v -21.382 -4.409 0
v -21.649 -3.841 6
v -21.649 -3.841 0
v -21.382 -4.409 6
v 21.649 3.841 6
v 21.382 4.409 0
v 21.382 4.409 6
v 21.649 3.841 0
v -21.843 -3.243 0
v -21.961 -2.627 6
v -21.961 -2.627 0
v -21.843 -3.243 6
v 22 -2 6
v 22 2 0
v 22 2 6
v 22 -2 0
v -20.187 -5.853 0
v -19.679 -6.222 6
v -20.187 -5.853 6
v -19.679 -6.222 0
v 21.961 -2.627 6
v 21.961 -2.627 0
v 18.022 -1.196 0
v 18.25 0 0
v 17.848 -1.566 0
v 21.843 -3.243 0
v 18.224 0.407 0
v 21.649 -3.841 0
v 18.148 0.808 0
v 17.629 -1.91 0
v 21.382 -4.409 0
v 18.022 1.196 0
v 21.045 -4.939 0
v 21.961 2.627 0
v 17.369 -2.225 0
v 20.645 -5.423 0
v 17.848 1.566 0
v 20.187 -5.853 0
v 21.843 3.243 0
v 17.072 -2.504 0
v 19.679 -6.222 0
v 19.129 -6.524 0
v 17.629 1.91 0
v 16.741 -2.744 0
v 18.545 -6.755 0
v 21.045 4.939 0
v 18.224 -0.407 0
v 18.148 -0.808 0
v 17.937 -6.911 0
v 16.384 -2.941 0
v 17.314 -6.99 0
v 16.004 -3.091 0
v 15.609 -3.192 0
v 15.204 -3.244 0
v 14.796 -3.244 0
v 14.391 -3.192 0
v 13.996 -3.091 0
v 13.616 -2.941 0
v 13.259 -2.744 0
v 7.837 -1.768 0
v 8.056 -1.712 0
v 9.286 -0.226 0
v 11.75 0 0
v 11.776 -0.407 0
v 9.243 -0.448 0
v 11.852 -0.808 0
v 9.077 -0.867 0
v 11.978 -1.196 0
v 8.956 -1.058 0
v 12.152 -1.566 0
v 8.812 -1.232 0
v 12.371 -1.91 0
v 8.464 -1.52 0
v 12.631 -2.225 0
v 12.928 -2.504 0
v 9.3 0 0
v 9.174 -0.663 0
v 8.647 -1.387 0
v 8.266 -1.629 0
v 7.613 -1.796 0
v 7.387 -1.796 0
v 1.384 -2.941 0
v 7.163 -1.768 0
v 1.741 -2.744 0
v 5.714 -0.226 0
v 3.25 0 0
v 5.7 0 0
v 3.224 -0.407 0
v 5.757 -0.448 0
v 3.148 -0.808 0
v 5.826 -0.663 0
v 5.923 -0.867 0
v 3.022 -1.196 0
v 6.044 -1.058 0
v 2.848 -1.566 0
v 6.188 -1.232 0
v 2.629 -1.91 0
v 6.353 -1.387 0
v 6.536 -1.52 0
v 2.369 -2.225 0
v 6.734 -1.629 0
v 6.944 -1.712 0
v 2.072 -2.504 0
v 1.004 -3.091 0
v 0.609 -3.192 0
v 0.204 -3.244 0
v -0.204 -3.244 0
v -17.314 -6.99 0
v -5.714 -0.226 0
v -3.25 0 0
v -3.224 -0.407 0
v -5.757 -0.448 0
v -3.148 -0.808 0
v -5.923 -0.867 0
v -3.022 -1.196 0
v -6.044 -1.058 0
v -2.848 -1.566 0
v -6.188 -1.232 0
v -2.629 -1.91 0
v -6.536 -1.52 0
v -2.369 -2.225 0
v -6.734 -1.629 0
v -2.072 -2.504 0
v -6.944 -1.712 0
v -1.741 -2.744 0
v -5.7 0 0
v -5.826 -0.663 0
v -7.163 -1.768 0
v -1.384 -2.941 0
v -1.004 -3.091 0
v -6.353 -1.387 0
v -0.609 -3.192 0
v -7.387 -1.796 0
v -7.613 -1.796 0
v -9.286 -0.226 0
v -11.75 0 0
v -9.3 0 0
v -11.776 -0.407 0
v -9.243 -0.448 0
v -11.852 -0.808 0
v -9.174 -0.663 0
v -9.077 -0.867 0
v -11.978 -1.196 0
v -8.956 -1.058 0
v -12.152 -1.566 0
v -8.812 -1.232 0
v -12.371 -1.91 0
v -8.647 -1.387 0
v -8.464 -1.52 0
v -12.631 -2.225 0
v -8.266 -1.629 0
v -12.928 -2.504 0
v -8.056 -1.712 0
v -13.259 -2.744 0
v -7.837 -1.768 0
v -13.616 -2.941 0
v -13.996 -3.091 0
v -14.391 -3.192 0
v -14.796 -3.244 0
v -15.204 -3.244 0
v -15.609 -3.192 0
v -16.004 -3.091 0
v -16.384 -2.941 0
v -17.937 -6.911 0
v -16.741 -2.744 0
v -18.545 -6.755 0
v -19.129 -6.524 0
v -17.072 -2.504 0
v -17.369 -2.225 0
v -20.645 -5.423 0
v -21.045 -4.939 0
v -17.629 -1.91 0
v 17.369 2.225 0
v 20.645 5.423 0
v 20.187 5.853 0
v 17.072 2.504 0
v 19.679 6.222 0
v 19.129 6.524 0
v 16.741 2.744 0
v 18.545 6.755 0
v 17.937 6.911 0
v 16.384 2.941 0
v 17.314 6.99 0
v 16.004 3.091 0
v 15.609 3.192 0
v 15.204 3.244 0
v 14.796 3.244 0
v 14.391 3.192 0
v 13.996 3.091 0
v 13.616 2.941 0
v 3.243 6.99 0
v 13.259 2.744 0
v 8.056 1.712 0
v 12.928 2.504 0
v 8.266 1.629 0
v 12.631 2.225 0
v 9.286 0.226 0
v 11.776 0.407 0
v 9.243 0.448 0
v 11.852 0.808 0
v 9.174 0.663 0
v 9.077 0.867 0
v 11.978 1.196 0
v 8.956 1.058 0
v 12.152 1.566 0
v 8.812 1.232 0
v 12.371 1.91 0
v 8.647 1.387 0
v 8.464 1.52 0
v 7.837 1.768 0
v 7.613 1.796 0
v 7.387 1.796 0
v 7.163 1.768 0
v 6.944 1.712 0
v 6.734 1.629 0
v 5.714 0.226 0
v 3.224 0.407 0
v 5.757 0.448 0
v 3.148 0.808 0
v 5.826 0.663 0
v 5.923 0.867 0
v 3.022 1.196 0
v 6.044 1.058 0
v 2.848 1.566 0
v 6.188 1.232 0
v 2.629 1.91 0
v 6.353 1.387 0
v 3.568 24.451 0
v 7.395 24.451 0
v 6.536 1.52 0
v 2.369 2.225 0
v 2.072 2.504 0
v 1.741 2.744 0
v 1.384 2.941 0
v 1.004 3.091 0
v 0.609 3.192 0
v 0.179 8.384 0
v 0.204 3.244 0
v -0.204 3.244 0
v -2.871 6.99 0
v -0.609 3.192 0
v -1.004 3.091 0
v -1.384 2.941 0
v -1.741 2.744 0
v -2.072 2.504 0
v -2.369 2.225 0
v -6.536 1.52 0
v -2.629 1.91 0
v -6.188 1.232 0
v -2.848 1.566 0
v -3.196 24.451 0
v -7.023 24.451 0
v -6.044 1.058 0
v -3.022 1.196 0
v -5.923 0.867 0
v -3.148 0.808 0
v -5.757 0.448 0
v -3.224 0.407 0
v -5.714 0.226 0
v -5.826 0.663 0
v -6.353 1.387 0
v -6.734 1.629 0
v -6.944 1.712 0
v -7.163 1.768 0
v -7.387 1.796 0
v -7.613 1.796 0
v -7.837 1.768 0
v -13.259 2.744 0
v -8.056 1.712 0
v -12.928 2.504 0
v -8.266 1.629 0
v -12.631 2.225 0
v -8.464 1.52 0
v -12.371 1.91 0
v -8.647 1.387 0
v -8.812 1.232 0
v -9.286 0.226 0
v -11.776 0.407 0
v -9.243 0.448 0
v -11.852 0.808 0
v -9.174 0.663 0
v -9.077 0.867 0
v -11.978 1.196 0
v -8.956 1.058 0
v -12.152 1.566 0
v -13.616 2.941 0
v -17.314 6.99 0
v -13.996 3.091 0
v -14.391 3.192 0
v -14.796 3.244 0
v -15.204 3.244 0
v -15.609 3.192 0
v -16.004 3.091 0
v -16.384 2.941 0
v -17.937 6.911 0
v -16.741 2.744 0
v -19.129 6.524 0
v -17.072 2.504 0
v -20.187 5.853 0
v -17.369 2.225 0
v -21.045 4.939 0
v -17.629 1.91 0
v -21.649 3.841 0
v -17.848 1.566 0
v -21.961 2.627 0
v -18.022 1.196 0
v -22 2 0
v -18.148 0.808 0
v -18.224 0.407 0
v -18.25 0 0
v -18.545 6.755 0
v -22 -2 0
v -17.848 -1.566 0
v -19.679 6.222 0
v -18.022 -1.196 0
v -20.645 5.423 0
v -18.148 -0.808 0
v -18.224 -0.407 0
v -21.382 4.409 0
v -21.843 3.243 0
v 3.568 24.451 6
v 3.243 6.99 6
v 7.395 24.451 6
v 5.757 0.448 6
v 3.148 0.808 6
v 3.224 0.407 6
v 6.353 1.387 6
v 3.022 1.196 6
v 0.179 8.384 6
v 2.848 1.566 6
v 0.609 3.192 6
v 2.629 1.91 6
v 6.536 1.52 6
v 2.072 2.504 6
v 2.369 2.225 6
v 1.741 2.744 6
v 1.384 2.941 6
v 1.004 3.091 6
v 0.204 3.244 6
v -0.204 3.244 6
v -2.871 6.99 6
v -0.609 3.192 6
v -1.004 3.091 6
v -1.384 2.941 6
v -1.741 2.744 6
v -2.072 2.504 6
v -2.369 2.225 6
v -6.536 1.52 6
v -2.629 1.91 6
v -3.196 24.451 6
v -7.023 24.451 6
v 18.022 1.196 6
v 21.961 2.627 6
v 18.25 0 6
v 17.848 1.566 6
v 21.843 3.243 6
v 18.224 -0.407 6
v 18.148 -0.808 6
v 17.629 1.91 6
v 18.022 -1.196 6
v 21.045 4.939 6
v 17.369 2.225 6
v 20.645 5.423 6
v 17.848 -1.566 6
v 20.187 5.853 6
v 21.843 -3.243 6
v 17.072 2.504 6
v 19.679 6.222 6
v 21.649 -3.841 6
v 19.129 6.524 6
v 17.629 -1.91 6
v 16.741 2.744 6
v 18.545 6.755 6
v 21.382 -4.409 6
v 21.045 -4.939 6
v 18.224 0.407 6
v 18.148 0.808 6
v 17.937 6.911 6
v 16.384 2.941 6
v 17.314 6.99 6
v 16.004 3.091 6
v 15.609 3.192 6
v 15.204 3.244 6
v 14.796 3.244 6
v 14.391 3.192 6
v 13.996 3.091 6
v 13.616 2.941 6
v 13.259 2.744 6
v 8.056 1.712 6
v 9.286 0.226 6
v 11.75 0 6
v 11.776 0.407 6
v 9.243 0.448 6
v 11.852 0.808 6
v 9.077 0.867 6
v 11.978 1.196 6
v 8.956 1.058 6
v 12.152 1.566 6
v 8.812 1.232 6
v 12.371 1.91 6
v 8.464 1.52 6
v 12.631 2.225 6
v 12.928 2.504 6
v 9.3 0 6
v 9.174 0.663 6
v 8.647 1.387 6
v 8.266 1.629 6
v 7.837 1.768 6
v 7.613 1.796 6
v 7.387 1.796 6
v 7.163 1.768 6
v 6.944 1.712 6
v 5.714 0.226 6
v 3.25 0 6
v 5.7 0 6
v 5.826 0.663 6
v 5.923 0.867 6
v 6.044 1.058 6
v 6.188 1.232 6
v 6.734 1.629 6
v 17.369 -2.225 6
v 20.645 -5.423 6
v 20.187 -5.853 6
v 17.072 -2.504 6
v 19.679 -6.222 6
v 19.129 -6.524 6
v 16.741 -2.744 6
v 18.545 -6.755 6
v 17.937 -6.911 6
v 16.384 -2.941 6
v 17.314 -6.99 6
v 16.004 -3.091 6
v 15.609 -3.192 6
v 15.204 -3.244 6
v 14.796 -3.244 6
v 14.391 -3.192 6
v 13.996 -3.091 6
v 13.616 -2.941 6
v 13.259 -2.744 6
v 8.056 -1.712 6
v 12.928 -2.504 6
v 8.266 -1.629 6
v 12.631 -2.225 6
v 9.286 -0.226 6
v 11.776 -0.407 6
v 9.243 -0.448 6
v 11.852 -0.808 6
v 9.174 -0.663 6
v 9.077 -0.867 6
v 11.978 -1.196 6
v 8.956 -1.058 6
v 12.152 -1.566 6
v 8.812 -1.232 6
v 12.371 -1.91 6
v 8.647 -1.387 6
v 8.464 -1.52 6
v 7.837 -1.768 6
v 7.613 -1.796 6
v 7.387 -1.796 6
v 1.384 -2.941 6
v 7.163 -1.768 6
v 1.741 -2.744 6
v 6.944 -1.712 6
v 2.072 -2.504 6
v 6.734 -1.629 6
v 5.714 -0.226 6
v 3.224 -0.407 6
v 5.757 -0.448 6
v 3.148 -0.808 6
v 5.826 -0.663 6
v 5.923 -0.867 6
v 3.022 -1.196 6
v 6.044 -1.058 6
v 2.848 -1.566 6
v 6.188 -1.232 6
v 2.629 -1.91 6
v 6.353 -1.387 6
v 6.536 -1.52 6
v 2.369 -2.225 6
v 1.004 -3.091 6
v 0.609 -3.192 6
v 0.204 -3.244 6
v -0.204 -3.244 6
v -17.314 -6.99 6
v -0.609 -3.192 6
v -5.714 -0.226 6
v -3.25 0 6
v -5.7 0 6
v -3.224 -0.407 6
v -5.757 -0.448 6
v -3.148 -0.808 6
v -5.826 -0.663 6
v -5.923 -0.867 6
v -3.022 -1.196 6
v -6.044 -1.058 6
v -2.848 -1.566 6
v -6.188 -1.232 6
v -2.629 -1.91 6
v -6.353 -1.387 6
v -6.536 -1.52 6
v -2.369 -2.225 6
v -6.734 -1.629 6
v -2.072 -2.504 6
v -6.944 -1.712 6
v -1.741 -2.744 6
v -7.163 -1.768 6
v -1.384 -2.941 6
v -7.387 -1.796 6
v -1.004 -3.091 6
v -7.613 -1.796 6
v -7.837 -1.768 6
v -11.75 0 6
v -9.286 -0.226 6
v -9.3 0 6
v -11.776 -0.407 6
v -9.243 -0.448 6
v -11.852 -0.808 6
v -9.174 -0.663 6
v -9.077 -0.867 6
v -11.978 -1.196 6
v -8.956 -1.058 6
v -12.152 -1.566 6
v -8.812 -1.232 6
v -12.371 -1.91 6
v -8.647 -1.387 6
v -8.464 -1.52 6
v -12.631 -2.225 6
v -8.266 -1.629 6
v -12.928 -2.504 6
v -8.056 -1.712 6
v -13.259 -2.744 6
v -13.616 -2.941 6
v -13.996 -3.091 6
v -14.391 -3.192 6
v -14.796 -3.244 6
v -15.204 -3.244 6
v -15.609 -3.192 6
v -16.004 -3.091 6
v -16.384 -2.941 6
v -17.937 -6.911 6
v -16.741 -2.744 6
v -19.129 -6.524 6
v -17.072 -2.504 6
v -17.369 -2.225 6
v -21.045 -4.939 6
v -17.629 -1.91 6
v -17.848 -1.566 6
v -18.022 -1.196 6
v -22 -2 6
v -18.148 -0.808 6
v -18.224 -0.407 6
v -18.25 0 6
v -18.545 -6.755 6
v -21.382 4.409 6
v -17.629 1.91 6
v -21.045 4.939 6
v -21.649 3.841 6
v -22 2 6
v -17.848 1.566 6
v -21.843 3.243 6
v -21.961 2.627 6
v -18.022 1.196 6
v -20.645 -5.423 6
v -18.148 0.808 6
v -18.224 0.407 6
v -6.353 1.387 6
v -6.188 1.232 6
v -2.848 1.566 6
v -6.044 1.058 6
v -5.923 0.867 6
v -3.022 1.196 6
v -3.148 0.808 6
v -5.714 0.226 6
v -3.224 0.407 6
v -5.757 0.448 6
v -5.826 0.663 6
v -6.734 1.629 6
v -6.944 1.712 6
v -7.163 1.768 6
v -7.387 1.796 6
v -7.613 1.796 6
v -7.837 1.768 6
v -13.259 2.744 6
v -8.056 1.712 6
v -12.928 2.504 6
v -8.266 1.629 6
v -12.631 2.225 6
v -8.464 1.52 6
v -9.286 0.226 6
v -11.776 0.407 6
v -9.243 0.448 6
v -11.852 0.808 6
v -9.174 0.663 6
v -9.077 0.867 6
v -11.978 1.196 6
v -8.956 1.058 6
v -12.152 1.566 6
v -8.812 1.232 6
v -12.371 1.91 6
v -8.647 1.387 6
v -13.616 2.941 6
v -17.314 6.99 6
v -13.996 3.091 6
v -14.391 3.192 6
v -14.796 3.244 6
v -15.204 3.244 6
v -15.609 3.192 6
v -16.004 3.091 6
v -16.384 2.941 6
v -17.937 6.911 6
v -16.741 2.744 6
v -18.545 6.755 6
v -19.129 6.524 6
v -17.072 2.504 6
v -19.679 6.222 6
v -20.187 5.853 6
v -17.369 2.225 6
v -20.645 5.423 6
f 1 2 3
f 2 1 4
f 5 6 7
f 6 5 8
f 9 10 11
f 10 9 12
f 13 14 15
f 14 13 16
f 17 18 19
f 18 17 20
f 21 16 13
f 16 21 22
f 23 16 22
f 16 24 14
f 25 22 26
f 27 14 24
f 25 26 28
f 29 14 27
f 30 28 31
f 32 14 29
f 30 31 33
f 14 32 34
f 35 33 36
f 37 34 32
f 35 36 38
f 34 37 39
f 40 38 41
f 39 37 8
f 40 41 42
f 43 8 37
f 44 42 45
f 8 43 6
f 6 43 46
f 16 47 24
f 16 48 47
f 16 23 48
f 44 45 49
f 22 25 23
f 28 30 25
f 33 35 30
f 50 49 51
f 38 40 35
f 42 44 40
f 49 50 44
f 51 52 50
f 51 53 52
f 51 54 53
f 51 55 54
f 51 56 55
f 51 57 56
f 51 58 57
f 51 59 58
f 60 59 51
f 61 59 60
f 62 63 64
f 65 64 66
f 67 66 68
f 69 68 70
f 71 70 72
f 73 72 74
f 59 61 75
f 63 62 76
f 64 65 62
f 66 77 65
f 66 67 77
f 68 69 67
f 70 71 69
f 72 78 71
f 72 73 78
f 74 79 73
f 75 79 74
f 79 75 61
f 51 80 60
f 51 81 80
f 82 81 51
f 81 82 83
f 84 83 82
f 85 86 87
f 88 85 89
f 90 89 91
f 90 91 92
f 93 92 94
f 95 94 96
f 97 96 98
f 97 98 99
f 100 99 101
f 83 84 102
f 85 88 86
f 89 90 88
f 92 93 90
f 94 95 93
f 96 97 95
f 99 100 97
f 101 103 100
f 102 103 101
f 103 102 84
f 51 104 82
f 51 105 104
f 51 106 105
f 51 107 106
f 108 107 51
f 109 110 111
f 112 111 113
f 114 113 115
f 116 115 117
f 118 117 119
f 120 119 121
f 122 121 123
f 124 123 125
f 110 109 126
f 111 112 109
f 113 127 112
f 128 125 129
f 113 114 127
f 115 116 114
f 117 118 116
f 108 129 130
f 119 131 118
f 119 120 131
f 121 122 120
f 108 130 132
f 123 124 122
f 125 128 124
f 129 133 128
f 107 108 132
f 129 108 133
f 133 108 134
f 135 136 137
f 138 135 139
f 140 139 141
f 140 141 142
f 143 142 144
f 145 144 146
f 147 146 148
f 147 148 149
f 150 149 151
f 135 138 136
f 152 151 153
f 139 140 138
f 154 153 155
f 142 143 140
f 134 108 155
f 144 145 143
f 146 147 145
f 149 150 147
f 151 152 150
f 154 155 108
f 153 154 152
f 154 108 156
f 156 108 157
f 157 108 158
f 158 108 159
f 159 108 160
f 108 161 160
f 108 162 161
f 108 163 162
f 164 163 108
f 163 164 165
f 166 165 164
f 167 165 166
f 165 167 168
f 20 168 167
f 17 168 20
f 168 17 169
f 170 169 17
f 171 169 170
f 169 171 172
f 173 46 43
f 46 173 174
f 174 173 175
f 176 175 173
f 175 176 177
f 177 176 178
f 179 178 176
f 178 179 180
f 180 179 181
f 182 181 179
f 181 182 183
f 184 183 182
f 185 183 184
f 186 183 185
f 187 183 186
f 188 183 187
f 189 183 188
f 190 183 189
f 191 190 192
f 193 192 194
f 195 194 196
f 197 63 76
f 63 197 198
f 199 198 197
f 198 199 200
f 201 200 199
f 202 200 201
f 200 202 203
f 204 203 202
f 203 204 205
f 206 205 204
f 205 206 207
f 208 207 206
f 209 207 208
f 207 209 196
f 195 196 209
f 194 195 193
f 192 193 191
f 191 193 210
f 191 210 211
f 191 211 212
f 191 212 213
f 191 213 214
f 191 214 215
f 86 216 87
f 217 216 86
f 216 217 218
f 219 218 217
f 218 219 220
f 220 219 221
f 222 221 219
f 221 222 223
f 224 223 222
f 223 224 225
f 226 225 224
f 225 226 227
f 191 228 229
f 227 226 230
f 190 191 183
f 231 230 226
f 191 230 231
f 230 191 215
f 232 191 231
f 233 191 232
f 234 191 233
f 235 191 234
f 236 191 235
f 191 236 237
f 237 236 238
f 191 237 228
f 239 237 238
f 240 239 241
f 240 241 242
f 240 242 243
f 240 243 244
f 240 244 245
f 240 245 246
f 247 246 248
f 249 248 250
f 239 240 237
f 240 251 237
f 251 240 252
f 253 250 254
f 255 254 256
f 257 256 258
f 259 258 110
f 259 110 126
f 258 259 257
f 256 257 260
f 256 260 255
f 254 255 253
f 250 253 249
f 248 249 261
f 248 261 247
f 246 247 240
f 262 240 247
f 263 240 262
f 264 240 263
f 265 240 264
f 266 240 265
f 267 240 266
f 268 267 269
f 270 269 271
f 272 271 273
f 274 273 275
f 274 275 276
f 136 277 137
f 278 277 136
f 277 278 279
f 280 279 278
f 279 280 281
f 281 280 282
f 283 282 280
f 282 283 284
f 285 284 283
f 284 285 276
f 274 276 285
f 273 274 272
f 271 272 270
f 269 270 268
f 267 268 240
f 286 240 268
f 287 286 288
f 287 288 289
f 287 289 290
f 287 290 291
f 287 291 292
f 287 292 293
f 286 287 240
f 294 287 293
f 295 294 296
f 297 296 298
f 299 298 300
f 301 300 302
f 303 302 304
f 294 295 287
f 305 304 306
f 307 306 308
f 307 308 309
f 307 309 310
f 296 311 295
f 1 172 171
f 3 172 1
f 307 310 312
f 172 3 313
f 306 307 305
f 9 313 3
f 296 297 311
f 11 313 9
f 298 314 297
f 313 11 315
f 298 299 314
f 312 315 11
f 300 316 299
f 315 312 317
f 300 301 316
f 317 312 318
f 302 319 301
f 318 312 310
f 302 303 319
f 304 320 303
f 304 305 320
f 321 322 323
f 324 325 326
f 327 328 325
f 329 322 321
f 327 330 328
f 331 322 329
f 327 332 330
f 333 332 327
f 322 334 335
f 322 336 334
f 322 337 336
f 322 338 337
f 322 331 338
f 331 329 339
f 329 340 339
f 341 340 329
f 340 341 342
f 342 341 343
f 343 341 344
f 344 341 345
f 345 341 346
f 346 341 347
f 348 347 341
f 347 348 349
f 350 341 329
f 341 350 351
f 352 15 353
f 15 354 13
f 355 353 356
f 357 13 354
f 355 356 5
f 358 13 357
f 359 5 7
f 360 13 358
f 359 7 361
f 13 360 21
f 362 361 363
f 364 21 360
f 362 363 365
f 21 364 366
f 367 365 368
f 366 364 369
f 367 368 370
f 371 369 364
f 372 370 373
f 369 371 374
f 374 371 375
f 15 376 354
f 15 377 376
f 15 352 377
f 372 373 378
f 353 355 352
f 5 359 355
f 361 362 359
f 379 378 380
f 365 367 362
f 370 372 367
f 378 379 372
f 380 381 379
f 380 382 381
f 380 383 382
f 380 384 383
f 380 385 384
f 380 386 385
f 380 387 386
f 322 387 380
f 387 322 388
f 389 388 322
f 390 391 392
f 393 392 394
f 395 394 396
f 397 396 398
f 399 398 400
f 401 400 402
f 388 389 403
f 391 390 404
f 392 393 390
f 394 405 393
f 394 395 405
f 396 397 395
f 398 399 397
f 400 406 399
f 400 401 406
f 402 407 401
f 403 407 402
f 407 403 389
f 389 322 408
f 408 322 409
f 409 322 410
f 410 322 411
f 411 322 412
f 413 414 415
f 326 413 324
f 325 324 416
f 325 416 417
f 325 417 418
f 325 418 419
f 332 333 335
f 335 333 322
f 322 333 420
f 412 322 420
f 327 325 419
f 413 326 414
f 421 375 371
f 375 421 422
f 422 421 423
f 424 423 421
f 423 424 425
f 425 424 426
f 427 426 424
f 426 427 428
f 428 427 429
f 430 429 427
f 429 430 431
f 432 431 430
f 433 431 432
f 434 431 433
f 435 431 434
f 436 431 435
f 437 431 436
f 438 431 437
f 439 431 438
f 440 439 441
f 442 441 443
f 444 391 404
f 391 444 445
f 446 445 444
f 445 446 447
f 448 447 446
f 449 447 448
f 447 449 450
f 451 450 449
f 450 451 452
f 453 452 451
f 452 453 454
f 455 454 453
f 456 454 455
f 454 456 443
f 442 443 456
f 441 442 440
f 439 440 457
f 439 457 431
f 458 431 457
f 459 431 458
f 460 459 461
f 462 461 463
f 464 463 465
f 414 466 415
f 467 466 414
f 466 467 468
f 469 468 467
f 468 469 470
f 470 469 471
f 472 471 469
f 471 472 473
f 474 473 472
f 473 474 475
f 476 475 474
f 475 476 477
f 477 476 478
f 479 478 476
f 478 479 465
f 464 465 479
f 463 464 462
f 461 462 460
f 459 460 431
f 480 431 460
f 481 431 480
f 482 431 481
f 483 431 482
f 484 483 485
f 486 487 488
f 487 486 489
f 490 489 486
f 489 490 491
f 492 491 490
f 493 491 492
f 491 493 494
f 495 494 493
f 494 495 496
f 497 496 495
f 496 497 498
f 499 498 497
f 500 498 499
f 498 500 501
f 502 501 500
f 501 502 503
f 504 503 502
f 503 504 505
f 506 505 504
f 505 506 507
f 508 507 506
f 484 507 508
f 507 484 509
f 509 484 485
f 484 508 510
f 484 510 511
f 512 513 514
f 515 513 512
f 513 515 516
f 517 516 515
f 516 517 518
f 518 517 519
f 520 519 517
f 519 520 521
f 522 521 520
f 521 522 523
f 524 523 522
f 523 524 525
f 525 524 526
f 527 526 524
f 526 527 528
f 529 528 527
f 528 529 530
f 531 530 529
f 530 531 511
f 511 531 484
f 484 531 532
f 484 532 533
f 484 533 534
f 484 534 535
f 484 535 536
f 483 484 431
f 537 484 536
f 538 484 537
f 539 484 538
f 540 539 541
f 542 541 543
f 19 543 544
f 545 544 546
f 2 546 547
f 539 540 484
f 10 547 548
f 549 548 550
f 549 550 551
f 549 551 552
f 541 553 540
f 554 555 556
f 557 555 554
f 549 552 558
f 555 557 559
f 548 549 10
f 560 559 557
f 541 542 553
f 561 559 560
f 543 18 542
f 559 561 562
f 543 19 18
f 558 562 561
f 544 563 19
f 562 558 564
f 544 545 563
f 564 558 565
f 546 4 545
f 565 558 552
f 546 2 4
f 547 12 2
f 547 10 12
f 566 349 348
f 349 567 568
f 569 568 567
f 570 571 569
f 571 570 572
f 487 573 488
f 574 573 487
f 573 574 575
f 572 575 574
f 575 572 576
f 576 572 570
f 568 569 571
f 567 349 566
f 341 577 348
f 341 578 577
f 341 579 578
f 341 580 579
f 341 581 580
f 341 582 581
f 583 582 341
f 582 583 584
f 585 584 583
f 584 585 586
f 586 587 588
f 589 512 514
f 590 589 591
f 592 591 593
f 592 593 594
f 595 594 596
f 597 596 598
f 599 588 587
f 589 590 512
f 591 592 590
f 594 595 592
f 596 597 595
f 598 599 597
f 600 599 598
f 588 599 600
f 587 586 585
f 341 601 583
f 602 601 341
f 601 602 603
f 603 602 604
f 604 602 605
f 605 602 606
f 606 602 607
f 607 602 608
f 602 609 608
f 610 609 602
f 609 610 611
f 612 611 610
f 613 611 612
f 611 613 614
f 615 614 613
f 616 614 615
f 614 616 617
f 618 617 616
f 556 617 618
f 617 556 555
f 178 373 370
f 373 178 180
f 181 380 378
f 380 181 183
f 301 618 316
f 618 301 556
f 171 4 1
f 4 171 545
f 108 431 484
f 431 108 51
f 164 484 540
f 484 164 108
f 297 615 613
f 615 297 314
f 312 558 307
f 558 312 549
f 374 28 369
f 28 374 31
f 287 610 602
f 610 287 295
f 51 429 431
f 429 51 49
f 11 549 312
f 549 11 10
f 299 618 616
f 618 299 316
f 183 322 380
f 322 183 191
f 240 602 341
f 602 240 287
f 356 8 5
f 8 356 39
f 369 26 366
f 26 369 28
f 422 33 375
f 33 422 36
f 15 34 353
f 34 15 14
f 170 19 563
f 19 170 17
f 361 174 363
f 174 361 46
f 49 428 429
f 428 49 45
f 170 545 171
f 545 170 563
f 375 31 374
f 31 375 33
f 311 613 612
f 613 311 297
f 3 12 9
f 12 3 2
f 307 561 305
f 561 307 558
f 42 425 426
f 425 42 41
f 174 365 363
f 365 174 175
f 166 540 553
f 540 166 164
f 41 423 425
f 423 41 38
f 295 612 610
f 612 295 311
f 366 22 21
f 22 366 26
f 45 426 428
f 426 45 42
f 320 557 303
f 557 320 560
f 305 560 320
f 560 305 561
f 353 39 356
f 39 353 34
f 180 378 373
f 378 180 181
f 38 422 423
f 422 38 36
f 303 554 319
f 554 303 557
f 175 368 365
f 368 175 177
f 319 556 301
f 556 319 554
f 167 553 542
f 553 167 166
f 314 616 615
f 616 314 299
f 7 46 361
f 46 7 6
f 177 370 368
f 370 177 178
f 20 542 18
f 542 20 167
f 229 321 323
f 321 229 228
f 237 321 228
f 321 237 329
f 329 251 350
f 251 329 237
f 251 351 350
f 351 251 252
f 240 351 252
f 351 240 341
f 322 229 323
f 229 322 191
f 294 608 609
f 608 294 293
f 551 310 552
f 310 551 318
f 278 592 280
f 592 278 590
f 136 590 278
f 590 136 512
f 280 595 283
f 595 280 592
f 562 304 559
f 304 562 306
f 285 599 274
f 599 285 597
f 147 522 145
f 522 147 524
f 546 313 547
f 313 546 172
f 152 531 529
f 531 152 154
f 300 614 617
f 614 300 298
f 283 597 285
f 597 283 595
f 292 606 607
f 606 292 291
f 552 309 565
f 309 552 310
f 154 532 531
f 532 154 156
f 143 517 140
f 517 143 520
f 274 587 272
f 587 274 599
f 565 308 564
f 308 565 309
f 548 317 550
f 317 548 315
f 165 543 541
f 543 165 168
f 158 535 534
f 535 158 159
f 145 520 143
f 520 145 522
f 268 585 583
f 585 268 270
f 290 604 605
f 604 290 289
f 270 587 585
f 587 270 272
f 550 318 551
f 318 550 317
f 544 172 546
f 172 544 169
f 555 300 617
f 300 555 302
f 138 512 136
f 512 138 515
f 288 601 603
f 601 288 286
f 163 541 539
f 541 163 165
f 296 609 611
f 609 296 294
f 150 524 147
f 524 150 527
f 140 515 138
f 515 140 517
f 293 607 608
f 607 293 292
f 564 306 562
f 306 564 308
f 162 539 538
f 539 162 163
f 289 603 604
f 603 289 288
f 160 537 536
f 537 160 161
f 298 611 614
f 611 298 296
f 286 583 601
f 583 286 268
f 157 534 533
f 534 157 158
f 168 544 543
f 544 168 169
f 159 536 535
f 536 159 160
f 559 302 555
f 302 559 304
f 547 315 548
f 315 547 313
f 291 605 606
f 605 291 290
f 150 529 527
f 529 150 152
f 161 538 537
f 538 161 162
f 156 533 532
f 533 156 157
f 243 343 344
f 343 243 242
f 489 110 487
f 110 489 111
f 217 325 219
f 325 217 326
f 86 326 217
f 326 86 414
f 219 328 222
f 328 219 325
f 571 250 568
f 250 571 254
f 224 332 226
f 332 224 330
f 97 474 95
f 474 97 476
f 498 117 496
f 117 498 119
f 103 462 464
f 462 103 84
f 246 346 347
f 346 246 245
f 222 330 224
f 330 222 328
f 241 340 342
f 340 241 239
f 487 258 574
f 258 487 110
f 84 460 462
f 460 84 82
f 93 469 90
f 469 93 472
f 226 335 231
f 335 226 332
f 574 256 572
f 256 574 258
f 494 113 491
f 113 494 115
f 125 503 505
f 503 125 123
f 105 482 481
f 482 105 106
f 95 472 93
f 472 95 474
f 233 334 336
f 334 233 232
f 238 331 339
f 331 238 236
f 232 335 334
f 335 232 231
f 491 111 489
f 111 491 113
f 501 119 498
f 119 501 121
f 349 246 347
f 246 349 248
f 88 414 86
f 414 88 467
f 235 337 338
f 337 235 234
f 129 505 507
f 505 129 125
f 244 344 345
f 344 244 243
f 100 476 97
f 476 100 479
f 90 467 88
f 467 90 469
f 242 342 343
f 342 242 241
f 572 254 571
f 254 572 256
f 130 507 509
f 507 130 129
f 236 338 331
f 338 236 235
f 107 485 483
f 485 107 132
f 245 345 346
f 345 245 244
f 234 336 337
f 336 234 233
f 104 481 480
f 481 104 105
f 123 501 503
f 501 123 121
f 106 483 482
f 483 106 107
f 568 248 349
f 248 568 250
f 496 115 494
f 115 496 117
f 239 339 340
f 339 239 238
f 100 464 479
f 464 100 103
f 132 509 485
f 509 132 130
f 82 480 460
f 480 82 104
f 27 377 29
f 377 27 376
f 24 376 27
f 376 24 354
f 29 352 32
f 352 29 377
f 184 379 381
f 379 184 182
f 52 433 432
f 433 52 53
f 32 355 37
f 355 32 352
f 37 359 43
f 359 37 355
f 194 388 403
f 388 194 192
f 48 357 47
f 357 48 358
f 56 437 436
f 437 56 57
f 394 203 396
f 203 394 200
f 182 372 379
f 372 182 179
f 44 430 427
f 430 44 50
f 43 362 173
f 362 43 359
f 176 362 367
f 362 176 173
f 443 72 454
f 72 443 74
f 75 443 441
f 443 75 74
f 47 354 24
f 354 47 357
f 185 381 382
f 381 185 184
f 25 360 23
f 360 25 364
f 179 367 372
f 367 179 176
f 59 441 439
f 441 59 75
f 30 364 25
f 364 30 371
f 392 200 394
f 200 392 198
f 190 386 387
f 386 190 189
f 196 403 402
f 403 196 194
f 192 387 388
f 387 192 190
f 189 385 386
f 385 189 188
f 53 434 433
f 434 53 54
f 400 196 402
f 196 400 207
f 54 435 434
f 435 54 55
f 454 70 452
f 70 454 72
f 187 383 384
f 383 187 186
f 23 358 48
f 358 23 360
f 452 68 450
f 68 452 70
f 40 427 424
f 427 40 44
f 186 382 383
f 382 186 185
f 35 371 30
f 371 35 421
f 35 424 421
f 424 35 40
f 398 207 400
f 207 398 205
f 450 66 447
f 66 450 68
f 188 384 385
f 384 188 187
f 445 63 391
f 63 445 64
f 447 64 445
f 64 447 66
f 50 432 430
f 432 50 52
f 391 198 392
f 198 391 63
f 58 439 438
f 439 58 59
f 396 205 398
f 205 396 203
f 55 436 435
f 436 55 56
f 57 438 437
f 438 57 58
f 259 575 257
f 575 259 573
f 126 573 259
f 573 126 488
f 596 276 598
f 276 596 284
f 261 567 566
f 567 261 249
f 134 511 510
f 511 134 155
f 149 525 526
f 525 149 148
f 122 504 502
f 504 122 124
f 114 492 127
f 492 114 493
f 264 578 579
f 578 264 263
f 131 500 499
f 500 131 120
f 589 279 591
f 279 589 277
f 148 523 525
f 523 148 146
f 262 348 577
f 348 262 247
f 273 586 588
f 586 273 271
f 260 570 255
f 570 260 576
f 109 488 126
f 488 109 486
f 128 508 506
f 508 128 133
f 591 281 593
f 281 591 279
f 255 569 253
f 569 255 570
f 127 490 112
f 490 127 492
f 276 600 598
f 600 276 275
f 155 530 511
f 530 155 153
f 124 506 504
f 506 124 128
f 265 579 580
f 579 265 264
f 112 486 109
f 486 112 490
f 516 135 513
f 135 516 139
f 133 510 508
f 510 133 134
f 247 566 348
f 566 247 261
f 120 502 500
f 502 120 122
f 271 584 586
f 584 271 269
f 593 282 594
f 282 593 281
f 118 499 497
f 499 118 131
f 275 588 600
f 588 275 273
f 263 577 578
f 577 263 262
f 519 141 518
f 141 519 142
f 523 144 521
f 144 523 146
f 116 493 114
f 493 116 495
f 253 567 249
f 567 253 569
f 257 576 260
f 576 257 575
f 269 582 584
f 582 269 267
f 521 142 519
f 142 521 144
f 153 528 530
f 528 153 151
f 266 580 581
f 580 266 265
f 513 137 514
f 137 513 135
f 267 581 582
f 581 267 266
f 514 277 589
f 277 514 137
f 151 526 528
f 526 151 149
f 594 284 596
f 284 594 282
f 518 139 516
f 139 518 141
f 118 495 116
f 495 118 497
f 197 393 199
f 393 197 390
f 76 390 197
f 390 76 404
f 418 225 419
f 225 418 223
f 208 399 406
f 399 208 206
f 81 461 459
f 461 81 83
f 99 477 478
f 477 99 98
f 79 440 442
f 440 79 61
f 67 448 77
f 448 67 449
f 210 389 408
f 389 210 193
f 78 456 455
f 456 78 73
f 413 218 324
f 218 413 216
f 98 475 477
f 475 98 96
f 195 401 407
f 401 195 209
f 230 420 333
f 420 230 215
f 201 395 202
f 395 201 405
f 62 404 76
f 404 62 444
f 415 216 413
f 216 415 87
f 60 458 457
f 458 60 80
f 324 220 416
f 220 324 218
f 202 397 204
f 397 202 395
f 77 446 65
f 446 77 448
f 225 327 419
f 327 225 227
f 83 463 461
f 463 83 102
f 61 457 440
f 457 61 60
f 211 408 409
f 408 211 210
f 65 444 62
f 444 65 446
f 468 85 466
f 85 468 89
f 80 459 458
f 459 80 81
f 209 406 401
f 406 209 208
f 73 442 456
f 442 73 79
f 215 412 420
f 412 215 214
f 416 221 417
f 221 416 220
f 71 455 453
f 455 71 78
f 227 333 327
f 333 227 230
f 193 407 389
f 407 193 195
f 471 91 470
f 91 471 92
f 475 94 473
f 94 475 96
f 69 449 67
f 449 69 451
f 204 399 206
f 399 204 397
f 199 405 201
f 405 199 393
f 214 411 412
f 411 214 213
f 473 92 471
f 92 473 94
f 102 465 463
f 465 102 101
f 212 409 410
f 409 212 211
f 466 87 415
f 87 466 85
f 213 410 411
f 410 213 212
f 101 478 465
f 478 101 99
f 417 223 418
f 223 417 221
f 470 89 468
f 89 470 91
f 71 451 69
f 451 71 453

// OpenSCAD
$fn = 50;


difference() {
	union() {
		hull() {
			translate(v = [-17.0000000000, 2.0000000000, 0]) {
				cylinder(h = 6, r = 5);
			}
			translate(v = [17.0000000000, 2.0000000000, 0]) {
				cylinder(h = 6, r = 5);
			}
			translate(v = [-17.0000000000, -2.0000000000, 0]) {
				cylinder(h = 6, r = 5);
			}
			translate(v = [17.0000000000, -2.0000000000, 0]) {
				cylinder(h = 6, r = 5);
			}
		}
		translate(v = [0, 24, 0]) {
			linear_extrude(height = 6) {
				text(font = "DejaVu Sans Mono:style=Bold", halign = "center", size = 19.0000000000, text = "V", valign = "top");
			}
		}
	}
	union() {
		translate(v = [-15.0000000000, 0.0000000000, 0]) {
			translate(v = [0, 0, -100]) {
				cylinder(h = 200, r = 3.2500000000);
			}
		}
		translate(v = [0, 0, -100]) {
			cylinder(h = 200, r = 3.2500000000);
		}
		translate(v = [15.0000000000, 0.0000000000, 0]) {
			translate(v = [0, 0, -100]) {
				cylinder(h = 200, r = 3.2500000000);
			}
		}
		translate(v = [-15.0000000000, 0.0000000000, 0]) {
			translate(v = [0, 0, -100]) {
				cylinder(h = 200, r = 1.8000000000);
			}
		}
		translate(v = [-7.5000000000, 0.0000000000, 0]) {
			translate(v = [0, 0, -100]) {
				cylinder(h = 200, r = 1.8000000000);
			}
		}
		translate(v = [0, 0, -100]) {
			cylinder(h = 200, r = 1.8000000000);
		}
		translate(v = [7.5000000000, 0.0000000000, 0]) {
			translate(v = [0, 0, -100]) {
				cylinder(h = 200, r = 1.8000000000);
			}
		}
		translate(v = [15.0000000000, 0.0000000000, 0]) {
			translate(v = [0, 0, -100]) {
				cylinder(h = 200, r = 1.8000000000);
			}
		}
	}
}
